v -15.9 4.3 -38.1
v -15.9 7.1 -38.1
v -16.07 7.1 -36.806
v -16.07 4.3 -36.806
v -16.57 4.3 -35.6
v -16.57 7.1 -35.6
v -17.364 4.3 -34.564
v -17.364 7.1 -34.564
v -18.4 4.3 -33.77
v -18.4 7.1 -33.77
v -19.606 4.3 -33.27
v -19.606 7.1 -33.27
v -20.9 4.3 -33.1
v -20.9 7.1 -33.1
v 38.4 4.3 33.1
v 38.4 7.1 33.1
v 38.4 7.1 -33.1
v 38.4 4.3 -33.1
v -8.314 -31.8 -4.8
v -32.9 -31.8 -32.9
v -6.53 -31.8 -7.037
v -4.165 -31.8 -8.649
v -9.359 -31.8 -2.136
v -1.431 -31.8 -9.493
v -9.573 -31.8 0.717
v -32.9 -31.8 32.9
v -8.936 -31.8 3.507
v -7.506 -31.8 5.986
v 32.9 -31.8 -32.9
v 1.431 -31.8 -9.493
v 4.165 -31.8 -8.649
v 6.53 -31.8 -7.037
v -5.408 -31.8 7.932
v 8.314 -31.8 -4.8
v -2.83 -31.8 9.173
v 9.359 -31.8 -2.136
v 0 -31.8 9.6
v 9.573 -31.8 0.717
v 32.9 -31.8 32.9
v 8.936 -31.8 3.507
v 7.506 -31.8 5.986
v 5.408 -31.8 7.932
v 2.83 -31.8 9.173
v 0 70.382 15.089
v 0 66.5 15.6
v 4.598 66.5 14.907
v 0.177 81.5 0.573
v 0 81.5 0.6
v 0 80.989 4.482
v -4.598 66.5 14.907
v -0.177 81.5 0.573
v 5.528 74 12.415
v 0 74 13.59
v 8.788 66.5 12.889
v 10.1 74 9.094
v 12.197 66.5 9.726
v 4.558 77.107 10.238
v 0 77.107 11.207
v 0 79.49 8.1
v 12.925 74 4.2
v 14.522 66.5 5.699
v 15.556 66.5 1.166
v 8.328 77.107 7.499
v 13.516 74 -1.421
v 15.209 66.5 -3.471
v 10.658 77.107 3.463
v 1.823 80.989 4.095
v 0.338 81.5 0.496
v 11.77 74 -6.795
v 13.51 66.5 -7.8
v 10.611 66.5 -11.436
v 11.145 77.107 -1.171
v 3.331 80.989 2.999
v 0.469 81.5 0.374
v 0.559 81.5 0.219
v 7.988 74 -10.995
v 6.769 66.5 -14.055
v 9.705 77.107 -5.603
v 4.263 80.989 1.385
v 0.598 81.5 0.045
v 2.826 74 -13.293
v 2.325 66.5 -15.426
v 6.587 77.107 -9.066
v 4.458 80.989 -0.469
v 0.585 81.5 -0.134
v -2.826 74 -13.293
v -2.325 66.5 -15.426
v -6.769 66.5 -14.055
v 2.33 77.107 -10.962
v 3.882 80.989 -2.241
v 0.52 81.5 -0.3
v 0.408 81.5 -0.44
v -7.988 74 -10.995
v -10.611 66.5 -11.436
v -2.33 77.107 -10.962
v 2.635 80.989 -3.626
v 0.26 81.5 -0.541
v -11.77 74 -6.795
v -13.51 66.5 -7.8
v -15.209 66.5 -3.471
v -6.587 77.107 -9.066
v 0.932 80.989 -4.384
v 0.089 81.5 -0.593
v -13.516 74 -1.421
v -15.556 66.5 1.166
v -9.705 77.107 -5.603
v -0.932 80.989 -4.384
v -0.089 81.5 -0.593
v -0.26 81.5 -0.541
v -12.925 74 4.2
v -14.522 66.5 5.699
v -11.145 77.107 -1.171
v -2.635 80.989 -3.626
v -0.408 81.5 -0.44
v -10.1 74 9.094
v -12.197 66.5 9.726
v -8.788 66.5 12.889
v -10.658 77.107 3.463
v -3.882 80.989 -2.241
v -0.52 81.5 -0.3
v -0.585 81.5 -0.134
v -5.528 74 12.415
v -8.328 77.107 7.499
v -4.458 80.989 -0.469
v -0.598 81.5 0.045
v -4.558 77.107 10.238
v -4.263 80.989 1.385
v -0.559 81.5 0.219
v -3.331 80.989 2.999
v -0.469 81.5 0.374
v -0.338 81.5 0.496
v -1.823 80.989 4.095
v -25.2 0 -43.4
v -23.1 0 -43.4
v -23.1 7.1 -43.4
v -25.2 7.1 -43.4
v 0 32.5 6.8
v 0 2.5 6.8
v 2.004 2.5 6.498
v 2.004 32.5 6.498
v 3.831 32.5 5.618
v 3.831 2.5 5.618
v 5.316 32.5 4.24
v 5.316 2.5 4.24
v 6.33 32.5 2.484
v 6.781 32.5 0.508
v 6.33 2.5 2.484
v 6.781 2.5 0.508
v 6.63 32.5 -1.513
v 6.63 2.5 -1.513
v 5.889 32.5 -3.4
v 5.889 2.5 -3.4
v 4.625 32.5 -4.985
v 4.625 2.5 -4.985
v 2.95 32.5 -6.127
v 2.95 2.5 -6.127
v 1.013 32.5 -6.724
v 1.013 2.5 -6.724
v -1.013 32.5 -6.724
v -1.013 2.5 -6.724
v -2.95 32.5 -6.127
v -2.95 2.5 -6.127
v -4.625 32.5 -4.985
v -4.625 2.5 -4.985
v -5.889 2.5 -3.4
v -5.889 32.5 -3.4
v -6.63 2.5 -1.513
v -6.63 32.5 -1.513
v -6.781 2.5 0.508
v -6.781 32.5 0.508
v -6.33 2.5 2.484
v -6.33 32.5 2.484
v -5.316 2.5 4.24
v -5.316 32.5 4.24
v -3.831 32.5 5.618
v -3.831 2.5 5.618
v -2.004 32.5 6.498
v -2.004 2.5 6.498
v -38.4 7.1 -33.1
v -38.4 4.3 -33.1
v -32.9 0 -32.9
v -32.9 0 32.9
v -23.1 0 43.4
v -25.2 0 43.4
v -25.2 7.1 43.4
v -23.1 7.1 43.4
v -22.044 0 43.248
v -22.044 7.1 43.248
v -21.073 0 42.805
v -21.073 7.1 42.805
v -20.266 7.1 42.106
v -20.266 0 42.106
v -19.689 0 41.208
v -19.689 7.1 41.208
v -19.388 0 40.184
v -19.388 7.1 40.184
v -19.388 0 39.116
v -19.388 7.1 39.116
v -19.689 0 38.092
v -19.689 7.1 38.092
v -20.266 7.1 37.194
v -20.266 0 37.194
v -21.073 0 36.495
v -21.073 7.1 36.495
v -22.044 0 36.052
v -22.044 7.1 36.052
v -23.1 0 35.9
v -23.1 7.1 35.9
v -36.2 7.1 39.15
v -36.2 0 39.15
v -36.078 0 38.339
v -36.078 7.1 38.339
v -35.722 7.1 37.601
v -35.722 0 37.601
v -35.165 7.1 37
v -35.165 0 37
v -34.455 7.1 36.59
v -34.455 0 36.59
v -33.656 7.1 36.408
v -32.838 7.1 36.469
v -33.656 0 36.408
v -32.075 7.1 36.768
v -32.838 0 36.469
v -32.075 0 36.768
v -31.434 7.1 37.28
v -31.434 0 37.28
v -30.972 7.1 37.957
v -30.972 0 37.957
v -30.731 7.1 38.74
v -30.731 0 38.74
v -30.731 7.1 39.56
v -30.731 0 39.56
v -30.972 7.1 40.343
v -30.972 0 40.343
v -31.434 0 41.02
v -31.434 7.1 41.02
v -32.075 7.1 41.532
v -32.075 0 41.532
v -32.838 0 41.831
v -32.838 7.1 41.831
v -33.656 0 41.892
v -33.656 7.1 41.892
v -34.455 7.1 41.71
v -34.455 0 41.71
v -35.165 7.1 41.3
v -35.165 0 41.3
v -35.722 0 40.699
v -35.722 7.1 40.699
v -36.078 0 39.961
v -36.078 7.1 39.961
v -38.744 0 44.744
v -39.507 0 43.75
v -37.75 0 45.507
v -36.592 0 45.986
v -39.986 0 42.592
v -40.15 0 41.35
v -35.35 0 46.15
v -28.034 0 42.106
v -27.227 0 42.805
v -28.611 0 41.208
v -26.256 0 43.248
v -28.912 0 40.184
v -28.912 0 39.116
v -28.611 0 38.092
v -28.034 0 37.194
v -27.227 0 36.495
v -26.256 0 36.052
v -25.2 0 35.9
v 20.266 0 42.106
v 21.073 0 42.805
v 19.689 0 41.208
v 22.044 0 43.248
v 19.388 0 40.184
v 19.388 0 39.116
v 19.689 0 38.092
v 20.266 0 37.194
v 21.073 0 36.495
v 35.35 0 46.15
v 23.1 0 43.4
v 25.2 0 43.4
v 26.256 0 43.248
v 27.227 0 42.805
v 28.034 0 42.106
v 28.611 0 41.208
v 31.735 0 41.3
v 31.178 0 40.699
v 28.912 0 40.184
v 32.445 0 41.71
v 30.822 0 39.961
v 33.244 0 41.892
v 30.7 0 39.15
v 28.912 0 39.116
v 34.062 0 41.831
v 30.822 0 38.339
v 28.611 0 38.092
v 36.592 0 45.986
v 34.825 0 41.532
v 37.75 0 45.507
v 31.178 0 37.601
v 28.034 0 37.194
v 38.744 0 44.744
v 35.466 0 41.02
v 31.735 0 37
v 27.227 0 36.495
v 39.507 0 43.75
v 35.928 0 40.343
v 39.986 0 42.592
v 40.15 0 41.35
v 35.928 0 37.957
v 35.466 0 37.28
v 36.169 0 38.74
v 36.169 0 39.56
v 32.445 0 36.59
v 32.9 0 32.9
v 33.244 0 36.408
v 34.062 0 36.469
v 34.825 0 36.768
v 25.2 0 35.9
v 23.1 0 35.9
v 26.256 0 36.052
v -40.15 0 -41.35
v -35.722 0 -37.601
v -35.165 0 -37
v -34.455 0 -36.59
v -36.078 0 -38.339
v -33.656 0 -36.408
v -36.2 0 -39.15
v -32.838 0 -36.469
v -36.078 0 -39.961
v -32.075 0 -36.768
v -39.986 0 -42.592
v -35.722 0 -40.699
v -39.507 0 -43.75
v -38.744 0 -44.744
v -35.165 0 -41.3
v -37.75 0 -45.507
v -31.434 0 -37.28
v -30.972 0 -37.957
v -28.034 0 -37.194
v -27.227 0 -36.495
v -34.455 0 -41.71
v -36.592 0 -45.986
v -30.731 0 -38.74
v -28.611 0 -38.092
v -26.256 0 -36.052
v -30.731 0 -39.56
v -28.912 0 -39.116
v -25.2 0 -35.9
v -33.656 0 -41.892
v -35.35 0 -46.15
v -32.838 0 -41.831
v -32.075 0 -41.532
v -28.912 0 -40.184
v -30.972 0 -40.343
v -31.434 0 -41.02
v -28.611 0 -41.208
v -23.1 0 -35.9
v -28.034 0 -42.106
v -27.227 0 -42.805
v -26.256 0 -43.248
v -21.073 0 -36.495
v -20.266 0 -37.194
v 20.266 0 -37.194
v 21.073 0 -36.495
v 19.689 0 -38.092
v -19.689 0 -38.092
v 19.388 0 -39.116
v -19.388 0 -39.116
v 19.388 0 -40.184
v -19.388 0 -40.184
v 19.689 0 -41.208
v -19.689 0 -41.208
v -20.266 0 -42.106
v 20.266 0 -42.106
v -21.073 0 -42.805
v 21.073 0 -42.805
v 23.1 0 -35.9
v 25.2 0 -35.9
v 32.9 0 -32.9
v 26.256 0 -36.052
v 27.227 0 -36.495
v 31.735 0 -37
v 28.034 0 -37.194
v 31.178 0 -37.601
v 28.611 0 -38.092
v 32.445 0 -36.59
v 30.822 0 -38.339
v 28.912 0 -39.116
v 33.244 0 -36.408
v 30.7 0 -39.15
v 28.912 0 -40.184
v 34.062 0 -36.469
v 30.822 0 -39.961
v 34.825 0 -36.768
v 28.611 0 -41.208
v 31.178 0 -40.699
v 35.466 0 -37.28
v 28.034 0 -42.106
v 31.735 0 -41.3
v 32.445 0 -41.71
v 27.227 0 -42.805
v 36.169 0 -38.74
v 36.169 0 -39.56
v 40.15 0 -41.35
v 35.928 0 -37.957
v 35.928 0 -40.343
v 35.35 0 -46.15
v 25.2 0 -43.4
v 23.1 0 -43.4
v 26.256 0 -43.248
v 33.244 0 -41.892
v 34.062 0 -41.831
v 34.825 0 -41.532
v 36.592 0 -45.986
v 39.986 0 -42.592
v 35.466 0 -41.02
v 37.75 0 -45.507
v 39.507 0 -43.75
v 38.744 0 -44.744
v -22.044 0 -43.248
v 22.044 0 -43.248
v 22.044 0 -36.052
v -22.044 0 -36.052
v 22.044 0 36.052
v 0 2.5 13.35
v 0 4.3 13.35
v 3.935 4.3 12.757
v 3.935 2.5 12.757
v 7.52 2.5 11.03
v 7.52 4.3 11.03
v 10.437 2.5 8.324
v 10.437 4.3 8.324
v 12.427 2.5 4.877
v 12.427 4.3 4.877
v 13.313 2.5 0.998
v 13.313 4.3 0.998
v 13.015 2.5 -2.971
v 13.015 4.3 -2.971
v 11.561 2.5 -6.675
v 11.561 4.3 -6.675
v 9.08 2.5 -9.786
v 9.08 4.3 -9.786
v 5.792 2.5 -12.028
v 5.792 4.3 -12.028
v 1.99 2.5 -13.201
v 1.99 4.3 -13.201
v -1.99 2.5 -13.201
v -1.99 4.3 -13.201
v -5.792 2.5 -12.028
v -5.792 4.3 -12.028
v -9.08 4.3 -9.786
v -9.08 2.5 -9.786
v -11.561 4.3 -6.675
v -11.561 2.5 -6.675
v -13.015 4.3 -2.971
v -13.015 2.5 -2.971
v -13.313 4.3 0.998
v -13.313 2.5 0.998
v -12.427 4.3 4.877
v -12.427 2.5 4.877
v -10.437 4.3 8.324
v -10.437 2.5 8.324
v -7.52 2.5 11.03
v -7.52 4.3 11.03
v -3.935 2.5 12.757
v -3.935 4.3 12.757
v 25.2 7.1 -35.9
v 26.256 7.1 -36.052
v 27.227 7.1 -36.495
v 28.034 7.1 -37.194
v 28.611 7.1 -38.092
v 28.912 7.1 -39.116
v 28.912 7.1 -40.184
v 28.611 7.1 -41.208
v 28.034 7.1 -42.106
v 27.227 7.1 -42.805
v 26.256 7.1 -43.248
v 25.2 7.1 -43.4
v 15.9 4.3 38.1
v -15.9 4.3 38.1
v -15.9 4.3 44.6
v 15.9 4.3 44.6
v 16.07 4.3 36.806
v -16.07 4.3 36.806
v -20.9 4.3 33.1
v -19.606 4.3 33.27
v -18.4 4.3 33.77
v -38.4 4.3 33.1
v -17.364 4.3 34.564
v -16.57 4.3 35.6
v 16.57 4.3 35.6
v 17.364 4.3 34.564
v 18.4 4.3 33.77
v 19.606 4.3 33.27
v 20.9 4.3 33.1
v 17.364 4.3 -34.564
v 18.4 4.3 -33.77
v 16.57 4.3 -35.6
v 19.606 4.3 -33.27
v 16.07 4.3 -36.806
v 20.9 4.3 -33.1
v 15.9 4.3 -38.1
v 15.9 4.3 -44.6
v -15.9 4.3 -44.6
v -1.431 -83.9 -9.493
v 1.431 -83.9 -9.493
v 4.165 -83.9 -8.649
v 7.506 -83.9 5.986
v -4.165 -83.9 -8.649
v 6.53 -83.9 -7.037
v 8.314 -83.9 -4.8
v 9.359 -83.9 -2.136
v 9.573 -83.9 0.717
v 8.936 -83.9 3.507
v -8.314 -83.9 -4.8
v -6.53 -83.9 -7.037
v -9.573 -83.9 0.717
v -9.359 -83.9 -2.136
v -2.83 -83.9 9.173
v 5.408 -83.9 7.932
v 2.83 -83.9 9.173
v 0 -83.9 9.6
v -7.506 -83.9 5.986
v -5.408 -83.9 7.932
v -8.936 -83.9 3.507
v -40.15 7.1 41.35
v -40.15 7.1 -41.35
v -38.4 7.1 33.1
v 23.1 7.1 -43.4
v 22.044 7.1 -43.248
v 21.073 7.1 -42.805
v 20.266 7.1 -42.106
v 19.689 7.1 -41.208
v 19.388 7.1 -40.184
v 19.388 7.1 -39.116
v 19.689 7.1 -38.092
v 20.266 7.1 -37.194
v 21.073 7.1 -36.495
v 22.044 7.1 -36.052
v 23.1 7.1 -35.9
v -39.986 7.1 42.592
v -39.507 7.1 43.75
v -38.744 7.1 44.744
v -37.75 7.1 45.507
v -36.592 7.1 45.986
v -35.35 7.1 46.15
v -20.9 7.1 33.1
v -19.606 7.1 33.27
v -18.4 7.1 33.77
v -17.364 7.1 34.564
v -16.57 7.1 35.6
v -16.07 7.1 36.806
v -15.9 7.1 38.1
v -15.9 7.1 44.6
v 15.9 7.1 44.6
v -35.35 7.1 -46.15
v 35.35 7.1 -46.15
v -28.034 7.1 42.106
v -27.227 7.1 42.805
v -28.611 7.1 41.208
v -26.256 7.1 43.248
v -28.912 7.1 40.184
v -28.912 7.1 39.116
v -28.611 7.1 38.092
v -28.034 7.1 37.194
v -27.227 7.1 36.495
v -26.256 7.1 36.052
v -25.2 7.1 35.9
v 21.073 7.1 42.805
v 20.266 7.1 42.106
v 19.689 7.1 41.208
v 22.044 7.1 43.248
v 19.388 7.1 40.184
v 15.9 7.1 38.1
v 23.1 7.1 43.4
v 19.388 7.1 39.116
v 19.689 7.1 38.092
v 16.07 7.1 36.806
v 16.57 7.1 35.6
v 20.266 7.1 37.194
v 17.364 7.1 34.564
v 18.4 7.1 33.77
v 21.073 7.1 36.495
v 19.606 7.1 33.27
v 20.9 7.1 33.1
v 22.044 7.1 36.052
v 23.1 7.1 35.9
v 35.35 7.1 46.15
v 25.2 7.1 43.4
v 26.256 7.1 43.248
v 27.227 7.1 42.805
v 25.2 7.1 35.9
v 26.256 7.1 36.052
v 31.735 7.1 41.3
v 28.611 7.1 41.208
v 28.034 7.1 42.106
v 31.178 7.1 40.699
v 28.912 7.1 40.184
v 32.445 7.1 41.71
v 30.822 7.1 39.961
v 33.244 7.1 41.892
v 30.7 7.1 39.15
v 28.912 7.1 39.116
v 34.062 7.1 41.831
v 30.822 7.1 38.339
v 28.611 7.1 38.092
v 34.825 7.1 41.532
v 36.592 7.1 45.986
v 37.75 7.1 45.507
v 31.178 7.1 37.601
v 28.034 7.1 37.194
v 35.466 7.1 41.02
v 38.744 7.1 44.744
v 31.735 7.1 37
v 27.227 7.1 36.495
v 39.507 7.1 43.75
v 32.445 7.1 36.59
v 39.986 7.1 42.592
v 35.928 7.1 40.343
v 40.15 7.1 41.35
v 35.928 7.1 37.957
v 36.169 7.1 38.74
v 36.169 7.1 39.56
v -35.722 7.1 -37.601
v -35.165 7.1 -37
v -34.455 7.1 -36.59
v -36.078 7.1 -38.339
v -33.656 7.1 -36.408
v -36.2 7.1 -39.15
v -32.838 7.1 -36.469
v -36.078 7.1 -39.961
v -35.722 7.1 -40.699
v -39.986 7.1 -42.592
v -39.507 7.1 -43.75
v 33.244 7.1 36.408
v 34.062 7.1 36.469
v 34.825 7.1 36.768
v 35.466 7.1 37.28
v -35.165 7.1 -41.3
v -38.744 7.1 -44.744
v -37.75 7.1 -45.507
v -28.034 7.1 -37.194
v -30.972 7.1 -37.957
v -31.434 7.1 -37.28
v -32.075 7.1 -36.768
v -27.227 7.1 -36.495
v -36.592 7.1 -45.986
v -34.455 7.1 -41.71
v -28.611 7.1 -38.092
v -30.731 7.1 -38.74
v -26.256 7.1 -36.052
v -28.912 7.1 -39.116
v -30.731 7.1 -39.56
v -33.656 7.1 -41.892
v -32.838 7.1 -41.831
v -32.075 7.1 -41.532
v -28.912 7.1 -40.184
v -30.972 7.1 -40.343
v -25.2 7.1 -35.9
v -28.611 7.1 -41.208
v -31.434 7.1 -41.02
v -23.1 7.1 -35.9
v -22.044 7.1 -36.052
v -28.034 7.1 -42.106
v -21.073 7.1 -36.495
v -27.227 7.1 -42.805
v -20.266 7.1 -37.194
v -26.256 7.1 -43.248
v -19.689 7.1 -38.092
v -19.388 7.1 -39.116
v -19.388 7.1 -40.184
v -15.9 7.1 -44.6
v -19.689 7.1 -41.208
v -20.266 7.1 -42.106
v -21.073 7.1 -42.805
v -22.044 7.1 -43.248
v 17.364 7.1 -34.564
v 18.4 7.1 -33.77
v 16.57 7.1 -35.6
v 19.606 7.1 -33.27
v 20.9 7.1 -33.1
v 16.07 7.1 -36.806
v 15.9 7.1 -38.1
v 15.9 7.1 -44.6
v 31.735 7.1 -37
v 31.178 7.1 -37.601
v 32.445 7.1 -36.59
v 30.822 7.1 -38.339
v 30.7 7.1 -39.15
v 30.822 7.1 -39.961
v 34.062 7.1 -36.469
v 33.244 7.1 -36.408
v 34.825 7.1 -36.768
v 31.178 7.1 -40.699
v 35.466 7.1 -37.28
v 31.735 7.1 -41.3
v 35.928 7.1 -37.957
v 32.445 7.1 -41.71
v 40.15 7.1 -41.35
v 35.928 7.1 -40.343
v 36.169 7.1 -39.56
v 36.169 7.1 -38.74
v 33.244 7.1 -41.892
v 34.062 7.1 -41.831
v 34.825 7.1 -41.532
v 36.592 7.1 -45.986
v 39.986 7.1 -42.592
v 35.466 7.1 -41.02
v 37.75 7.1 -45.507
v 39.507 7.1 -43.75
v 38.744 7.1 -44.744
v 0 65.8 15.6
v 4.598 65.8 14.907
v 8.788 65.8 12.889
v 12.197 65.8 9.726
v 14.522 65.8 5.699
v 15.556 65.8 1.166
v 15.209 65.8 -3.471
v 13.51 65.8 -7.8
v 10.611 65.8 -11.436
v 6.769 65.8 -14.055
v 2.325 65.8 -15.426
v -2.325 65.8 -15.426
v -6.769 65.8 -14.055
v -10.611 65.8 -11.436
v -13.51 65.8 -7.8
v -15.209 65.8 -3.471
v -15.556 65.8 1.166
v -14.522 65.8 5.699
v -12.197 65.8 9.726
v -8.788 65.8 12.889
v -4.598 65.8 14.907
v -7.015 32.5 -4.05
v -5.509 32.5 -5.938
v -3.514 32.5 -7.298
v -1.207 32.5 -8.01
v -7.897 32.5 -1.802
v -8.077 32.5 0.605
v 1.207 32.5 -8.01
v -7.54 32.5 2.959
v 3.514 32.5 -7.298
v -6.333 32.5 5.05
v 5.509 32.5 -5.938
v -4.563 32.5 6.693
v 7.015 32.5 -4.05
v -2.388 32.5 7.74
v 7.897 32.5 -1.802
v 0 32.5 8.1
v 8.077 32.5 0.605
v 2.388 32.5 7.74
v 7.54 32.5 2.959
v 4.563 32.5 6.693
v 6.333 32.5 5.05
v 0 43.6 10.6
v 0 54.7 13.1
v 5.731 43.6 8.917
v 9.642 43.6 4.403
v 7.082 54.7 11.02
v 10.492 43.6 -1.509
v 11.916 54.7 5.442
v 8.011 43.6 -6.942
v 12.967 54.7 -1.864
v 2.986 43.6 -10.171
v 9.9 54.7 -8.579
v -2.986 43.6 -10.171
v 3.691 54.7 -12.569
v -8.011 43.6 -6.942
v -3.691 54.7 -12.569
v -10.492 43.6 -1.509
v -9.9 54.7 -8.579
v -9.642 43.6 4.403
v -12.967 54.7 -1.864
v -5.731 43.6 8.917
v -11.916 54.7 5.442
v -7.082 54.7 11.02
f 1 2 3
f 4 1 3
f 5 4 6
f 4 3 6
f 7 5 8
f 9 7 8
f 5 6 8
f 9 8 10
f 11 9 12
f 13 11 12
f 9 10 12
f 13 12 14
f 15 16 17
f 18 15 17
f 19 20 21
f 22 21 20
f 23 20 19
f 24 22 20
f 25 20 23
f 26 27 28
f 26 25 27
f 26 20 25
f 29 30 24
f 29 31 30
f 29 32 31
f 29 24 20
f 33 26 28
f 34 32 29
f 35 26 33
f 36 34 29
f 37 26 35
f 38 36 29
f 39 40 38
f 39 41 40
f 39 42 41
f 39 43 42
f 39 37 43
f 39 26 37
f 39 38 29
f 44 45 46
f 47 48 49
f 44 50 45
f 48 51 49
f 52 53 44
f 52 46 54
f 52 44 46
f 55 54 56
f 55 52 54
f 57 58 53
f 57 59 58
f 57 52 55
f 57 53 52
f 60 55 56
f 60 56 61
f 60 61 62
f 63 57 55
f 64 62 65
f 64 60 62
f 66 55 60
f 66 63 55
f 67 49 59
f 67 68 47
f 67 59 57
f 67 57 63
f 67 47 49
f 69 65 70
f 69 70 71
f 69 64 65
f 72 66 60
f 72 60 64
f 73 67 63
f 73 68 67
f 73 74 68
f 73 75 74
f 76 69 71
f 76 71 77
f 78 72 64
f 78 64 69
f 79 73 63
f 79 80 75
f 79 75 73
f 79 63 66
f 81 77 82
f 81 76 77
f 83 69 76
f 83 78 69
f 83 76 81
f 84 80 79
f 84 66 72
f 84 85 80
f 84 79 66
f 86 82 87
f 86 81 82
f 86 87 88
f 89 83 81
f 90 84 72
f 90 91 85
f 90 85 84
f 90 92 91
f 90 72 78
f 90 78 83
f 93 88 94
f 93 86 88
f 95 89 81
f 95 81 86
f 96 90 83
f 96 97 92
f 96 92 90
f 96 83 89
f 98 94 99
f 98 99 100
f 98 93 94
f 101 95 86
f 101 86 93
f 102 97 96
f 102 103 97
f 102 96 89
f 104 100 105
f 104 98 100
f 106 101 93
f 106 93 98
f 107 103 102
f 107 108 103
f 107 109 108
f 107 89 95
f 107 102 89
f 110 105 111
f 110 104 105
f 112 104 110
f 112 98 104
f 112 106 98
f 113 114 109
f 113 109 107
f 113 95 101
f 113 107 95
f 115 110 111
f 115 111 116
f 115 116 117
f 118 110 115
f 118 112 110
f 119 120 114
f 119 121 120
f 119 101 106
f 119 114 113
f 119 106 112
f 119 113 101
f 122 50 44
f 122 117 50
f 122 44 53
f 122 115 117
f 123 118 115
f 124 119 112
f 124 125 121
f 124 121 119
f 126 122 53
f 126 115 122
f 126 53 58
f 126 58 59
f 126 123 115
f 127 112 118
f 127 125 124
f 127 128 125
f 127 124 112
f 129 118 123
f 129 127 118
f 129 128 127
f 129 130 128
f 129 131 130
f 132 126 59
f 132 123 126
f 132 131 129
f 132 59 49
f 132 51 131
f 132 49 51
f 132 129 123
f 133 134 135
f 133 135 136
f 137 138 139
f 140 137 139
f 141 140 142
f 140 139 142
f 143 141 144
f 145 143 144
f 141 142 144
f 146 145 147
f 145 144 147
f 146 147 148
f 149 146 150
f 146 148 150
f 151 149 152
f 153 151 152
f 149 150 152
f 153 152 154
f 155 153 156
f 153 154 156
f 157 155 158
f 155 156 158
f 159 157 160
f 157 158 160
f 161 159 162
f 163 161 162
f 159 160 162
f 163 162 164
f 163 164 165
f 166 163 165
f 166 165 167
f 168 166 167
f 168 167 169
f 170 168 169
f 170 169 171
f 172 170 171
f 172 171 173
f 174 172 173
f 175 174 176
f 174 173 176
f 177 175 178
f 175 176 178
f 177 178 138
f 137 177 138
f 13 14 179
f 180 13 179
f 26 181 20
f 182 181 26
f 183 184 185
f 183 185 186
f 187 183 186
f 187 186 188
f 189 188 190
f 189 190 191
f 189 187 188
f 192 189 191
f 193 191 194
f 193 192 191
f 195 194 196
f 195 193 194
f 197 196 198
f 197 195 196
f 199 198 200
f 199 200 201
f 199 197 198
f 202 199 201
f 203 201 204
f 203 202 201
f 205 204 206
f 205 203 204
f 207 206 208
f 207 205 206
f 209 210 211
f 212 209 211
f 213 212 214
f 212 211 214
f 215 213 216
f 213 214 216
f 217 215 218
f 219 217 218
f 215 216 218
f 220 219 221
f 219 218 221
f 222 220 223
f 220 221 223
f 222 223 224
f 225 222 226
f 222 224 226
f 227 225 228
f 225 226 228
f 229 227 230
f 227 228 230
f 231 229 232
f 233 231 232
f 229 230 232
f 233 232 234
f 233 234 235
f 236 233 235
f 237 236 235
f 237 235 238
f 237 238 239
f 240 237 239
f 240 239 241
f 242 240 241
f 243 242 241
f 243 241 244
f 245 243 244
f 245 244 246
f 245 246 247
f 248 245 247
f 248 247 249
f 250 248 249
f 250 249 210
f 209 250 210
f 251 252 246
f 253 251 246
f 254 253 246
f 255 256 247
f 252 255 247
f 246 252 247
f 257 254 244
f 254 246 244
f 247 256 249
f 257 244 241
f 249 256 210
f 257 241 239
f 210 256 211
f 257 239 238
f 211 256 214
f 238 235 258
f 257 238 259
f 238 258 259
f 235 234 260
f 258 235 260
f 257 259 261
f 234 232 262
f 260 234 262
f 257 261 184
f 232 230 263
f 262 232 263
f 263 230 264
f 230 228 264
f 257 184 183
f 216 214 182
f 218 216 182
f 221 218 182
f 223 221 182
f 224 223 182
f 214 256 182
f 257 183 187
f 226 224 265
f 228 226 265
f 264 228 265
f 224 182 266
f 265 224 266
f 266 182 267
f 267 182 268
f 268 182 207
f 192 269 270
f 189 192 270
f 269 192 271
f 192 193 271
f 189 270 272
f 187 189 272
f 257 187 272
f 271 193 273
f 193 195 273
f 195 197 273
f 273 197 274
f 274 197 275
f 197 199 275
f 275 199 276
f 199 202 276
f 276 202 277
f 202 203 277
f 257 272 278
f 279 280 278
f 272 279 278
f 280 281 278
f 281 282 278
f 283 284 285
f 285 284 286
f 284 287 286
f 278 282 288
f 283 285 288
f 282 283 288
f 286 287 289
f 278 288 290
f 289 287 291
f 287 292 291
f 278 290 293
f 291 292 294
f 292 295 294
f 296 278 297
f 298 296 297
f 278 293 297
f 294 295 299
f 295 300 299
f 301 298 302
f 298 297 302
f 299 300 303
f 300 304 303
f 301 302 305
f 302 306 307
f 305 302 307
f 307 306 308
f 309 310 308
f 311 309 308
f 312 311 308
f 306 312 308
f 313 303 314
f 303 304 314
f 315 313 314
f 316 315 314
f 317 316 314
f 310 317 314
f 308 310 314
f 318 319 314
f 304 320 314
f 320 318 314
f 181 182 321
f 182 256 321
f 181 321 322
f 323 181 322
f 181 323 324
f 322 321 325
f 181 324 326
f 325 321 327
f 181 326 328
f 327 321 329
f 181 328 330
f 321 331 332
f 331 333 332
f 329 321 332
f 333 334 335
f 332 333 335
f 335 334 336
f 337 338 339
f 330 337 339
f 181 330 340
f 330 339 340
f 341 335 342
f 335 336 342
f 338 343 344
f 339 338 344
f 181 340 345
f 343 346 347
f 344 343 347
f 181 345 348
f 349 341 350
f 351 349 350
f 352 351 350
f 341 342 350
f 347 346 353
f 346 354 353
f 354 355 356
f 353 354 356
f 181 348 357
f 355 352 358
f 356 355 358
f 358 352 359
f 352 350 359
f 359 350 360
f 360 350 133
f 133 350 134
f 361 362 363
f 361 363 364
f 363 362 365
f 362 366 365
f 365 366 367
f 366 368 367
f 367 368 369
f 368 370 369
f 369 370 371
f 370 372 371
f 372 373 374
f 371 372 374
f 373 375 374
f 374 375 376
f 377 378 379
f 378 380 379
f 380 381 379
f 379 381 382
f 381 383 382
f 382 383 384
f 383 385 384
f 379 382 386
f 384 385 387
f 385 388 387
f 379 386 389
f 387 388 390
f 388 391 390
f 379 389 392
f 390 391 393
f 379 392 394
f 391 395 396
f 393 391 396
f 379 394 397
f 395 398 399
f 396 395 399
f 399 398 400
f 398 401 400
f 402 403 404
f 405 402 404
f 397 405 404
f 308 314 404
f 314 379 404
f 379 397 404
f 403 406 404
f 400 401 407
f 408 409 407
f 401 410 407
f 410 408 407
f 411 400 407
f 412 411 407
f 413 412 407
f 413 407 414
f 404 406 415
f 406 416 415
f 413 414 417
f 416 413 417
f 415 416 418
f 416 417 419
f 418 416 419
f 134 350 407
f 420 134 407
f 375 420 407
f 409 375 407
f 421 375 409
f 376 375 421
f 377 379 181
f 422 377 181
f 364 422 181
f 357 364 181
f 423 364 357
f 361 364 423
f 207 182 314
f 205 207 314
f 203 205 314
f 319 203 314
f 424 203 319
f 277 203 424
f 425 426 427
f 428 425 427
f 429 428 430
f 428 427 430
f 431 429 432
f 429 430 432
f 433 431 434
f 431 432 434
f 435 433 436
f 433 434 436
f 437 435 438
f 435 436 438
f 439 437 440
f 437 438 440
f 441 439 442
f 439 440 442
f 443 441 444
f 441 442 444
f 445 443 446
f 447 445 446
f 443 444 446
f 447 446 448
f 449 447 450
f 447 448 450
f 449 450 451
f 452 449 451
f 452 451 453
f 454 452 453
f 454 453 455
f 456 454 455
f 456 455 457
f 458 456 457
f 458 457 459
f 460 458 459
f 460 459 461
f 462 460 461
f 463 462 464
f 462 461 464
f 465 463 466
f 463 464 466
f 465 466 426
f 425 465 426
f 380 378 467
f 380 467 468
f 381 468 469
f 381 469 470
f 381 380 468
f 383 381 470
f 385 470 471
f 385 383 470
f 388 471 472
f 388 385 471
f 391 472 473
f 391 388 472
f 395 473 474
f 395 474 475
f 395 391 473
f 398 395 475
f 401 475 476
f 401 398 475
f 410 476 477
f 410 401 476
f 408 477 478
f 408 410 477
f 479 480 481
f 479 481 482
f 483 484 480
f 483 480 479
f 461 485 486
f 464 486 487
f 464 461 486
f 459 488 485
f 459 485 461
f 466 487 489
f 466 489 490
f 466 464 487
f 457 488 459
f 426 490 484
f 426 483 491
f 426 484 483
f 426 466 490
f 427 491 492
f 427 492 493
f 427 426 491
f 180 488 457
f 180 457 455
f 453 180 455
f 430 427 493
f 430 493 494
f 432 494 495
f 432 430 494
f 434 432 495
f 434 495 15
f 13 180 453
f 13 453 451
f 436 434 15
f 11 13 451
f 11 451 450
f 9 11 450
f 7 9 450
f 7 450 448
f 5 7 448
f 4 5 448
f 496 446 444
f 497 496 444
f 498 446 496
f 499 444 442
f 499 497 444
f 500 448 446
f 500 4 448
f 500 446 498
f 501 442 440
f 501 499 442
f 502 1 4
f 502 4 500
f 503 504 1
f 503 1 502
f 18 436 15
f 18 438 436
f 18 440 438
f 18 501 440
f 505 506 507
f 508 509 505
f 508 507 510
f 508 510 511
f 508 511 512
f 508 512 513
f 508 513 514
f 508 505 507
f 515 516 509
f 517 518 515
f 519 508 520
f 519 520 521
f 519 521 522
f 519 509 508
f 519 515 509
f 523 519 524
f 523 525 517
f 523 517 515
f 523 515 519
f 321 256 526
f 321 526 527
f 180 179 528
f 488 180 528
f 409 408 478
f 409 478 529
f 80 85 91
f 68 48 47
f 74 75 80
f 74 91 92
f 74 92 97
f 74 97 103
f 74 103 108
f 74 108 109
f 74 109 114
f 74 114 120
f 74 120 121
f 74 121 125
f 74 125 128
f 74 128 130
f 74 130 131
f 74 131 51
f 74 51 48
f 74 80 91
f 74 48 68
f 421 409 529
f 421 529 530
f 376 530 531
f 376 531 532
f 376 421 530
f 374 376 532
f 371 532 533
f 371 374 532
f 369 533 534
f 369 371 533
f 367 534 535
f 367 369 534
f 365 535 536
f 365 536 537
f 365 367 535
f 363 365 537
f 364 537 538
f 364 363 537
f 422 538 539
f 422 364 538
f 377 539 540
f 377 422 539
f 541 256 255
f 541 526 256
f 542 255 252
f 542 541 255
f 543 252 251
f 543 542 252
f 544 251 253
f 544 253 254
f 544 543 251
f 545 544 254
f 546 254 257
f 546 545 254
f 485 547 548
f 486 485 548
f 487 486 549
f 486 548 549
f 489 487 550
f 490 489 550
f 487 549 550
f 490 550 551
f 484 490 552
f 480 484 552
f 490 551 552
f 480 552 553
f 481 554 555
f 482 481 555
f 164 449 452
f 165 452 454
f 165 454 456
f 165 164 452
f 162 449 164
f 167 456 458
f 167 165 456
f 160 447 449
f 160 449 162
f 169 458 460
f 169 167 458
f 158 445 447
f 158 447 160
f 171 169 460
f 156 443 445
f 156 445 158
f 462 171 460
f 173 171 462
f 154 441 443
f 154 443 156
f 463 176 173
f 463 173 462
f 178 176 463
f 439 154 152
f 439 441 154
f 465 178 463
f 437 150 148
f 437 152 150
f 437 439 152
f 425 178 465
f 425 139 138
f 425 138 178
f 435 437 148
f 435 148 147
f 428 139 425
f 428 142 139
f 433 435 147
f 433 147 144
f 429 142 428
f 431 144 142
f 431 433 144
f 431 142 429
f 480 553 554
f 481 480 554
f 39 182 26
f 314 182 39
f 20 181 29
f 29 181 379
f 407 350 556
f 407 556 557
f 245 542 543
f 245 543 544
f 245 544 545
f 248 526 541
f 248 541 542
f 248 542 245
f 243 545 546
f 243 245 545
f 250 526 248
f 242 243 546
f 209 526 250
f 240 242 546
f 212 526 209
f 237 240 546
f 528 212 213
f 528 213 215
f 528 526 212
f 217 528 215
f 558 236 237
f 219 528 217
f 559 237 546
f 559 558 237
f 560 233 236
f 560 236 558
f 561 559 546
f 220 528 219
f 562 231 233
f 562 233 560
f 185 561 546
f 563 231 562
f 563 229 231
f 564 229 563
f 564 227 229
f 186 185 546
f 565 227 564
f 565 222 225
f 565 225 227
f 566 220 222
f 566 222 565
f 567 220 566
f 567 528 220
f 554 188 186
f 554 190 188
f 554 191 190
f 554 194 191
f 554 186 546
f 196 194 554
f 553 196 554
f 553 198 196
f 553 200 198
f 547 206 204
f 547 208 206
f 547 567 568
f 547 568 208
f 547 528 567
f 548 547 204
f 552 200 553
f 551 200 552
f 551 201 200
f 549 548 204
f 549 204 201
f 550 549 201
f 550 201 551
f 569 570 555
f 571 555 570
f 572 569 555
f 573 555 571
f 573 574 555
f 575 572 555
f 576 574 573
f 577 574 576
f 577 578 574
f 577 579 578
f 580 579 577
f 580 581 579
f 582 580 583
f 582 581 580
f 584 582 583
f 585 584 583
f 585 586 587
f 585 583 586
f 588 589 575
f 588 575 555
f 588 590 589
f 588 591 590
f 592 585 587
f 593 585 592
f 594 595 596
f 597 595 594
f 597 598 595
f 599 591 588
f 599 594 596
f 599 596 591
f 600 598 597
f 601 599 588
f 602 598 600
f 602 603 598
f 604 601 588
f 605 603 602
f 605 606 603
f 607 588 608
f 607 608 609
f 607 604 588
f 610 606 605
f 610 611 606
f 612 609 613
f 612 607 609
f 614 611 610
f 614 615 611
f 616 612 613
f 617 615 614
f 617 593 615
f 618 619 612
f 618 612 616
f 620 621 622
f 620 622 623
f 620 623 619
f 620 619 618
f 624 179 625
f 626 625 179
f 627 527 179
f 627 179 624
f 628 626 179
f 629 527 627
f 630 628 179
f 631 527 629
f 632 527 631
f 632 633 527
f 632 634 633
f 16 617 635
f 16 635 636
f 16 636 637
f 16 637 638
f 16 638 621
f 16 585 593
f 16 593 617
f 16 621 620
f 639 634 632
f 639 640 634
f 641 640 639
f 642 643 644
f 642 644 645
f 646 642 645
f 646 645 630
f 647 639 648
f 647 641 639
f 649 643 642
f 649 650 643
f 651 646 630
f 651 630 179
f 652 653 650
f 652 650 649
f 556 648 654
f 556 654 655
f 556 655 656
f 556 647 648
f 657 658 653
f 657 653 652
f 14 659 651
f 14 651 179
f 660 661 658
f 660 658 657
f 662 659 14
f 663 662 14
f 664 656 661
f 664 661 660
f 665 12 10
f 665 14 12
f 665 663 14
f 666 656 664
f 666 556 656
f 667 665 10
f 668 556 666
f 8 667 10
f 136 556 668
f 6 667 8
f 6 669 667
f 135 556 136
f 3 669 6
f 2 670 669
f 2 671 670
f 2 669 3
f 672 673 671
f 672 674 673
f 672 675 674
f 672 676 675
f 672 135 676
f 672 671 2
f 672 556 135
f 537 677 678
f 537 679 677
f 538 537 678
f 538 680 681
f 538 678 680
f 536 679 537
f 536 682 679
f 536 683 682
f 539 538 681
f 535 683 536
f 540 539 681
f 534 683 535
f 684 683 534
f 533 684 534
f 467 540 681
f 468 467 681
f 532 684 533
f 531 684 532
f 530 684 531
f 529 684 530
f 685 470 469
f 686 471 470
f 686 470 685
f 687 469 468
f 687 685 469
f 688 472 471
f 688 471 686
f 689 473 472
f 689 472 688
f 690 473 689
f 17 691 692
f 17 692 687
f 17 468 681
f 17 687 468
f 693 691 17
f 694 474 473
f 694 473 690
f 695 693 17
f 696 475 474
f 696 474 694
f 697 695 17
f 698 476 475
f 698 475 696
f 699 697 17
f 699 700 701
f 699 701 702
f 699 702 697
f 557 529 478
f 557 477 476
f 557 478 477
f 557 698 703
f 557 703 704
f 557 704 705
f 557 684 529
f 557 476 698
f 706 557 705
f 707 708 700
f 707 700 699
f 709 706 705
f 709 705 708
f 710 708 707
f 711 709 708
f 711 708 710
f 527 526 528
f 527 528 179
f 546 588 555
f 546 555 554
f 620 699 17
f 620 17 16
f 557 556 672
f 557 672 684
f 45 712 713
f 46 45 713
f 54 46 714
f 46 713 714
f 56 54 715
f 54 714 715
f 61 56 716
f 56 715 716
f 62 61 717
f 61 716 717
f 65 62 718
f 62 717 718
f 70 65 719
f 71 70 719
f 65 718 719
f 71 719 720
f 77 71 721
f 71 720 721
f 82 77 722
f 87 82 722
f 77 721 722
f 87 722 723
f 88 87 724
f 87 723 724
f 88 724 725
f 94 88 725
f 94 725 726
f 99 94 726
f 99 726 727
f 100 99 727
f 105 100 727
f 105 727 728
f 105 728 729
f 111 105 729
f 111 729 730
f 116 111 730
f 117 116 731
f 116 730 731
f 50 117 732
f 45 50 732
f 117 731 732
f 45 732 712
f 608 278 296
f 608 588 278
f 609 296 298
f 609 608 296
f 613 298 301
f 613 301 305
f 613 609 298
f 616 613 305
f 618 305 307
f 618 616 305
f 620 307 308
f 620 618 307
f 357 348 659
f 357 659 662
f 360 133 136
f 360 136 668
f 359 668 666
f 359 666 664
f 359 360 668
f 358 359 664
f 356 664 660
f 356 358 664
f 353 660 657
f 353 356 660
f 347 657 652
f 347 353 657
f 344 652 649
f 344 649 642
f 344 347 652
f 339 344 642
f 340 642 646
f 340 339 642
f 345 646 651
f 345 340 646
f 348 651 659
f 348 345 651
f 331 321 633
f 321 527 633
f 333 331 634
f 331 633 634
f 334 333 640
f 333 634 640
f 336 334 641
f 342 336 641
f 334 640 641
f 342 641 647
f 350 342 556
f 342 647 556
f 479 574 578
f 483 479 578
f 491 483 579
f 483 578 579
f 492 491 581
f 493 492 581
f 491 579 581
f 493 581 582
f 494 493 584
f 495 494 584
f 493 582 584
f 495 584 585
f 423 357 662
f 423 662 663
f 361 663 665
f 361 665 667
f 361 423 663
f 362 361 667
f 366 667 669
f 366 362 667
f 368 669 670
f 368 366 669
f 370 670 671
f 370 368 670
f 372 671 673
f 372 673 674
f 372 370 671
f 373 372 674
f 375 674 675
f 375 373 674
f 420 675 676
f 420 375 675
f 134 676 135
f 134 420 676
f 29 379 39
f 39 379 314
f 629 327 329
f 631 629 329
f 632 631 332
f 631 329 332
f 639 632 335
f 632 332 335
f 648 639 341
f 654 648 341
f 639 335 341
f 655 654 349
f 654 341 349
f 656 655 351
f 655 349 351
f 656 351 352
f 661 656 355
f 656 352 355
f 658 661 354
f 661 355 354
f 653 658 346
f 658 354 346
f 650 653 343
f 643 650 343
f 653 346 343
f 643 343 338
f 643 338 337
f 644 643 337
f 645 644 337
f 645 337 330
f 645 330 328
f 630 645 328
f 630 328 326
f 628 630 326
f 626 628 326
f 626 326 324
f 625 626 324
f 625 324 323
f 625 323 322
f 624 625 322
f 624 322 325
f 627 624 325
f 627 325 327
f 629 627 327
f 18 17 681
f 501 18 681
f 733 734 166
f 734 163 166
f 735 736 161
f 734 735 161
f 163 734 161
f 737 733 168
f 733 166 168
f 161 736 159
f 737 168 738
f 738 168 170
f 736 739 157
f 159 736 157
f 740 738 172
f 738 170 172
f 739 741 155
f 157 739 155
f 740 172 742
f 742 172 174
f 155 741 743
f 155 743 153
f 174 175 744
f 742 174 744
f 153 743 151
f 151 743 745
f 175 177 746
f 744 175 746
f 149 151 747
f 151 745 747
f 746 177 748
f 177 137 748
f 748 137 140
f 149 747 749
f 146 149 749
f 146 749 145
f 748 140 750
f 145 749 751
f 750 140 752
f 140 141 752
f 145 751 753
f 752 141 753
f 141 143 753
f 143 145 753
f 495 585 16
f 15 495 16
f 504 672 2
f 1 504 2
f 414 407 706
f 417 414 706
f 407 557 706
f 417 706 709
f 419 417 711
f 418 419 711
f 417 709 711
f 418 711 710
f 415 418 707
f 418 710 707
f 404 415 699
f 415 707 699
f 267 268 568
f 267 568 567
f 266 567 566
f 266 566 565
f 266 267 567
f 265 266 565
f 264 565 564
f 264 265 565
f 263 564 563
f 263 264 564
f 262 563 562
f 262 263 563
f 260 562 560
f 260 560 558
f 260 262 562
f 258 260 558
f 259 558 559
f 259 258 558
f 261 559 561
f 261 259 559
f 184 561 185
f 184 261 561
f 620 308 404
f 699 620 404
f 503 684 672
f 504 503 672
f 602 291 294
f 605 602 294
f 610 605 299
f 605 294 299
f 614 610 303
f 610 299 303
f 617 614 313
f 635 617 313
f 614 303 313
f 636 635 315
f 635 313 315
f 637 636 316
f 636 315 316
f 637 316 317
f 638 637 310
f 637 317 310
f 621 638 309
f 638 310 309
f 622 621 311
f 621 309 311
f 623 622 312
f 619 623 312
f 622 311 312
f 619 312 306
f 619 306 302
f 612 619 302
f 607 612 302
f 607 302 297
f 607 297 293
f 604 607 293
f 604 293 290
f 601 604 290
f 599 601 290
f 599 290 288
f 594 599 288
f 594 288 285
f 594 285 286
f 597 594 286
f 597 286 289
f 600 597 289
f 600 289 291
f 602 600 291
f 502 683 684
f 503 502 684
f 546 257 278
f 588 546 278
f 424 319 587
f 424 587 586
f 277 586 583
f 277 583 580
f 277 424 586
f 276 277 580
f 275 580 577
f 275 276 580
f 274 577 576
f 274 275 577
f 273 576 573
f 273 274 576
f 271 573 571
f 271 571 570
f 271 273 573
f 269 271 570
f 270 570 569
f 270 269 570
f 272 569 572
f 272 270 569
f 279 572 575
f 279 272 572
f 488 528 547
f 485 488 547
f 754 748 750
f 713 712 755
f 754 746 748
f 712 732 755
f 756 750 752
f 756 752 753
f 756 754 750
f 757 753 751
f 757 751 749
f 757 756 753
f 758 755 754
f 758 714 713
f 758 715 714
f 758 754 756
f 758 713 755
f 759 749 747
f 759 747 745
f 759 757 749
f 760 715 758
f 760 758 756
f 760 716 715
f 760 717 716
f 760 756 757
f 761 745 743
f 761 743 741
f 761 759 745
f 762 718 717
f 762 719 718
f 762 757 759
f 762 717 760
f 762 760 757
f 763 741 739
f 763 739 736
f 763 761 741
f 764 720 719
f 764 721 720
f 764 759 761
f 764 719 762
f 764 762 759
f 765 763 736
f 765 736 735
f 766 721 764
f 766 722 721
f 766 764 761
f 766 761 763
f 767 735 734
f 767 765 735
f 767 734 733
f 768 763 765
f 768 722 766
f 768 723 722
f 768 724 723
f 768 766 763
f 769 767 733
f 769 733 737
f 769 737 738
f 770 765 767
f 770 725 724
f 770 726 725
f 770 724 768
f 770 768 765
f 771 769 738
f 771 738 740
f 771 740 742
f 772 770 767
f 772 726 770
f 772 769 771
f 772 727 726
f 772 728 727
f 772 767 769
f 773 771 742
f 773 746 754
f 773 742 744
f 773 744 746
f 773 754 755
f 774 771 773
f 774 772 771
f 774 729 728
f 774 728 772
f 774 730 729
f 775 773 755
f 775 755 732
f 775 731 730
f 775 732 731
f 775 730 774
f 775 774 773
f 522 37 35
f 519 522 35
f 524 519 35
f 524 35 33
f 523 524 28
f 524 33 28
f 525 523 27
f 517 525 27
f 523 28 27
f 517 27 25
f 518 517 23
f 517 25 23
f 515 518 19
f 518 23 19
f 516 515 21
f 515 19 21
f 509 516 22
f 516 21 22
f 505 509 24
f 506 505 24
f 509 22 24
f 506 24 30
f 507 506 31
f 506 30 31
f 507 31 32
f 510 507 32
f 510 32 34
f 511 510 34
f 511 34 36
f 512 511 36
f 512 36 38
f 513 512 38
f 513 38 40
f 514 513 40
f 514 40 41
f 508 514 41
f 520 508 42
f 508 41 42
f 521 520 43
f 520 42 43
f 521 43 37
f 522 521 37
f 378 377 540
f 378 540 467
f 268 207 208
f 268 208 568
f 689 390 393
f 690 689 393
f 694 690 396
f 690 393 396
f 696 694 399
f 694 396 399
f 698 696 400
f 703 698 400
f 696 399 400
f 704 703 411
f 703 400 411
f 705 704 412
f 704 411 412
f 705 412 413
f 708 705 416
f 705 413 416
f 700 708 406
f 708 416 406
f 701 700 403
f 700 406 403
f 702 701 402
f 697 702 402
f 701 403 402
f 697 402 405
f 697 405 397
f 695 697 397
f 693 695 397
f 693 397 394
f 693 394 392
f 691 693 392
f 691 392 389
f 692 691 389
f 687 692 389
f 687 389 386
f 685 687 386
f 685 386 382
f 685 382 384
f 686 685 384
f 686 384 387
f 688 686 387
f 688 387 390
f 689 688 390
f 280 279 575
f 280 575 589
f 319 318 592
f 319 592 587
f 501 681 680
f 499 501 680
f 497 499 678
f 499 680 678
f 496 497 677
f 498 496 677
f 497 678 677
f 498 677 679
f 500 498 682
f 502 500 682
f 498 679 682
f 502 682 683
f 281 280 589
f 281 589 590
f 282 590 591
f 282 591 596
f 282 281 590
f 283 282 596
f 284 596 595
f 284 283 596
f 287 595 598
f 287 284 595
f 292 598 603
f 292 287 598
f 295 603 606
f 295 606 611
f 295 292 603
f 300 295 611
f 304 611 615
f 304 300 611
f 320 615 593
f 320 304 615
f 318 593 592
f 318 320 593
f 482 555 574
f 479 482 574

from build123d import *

# Parameters (mm, degrees)
SKETCH1_W                = 80.3
SKETCH1_H                = 92.3
BOSS_EXTRUDE1_DEPTH      = 7.1
SKETCH2_W                = 65.8
SKETCH2_H                = 65.8
BOSS_EXTRUDE2_DEPTH      = 31.8
SKETCH3_R                = 9.6
BOSS_EXTRUDE3_DEPTH      = 52.1
CUT_EXTRUDE1_DEPTH       = 2.8
M5_CLEARANCE_SLOT1_D     = 5.5
FILLET1_R                = 4.8
M5_CLEARANCE_SLOT2_DEPTH = 7.1
SKETCH9_R                = 13.35
CUT_EXTRUDE2_DEPTH       = 1.8
SKETCH10_R               = 6.8
BOSS_EXTRUDE4_DEPTH      = 30
SKETCH11_R               = 15.6
BOSS_EXTRUDE5_DEPTH      = 49
FILLET2_R                = 15
CHAMFER1_SIZE            = 7.5
CHAMFER1_SIZE2           = 33.3


# Read off the part's stored shape, not the designer's step: M5 Clearance Slot2
with BuildPart() as part:
    # Sketch1 → Boss-Extrude1 (new body)
    with BuildSketch(Plane(origin=(0, 0, 0), x_dir=(1, 0, 0), z_dir=(0, 1, 0))):
        Rectangle(SKETCH1_W, SKETCH1_H)
    extrude(amount=BOSS_EXTRUDE1_DEPTH)

    # Sketch2 → Boss-Extrude2 (add)
    with BuildSketch(Plane.XZ):
        Rectangle(SKETCH2_W, SKETCH2_H)
    extrude(amount=BOSS_EXTRUDE2_DEPTH)

    # Sketch3 → Boss-Extrude3 (add)
    with BuildSketch(Plane.XZ.offset(31.8)):
        with Locations(Location((0, 0, 0), (0, 0, 90))):
            Circle(SKETCH3_R)
    extrude(amount=BOSS_EXTRUDE3_DEPTH)

    # Sketch4 → Cut-Extrude1 (cut)
    with BuildSketch(Plane(origin=(0, 7.1, 0), x_dir=(1, 0, 0), z_dir=(0, 1, 0))):
        with BuildLine():
            Line((-38.4, 33.1), (-38.4, -33.1))
            Line((-38.4, -33.1), (-20.9, -33.1))
            ThreePointArc((-20.9, -33.1), (-17.364466094, -34.564466094), (-15.9, -38.1))
            Line((-15.9, -38.1), (-15.9, -44.6))
            Line((-15.9, -44.6), (15.9, -44.6))
            Line((15.9, -44.6), (15.9, -38.1))
            ThreePointArc((15.9, -38.1), (17.364466094, -34.564466094), (20.9, -33.1))
            Line((20.9, -33.1), (38.4, -33.1))
            Line((38.4, -33.1), (38.4, 33.1))
            Line((38.4, 33.1), (20.9, 33.1))
            ThreePointArc((20.9, 33.1), (17.364466094, 34.564466094), (15.9, 38.1))
            Line((15.9, 38.1), (15.9, 44.6))
            Line((15.9, 44.6), (-15.9, 44.6))
            Line((-15.9, 44.6), (-15.9, 38.1))
            ThreePointArc((-15.9, 38.1), (-17.364466094, 34.564466094), (-20.9, 33.1))
            Line((-20.9, 33.1), (-38.4, 33.1))
        make_face()
    extrude(amount=-CUT_EXTRUDE1_DEPTH, mode=Mode.SUBTRACT)

    # M5 Clearance Slot1 (through all)
    with Locations(Plane(origin=(0, 7.1, 0), x_dir=(1, 0, 0), z_dir=(0, 1, 0))):
        with Locations((-33.45, 39.15), (33.45, 39.15), (33.45, -39.15), (-33.45, -39.15)):
            Hole(M5_CLEARANCE_SLOT1_D / 2)

    # Fillet1
    fillet1_edges = [part.edges().sort_by_distance(p)[0] for p in [
        (40.15, 3.55, 46.15),
        (-40.15, 3.55, 46.15),
        (-40.15, 3.55, -46.15),
        (40.15, 3.55, -46.15),
    ]]
    fillet(fillet1_edges, radius=FILLET1_R)

    # M5 Clearance Slot2 outline → M5 Clearance Slot2 (cut)
    with BuildSketch(Plane(origin=(0, 0, 0), x_dir=(1, 0, 0), z_dir=(0, 1, 0))):
        with BuildLine():
            Line((23.1, 35.9), (25.2, 35.9))
            ThreePointArc((25.2, 35.9), (28.95, 39.65), (25.2, 43.4))
            Line((25.2, 43.4), (23.1, 43.4))
            ThreePointArc((23.1, 43.4), (19.35, 39.65), (23.1, 35.9))
        make_face()
        with BuildLine():
            ThreePointArc((-23.1, 35.9), (-19.35, 39.65), (-23.1, 43.4))
            Line((-23.1, 43.4), (-25.2, 43.4))
            ThreePointArc((-25.2, 43.4), (-28.95, 39.65), (-25.2, 35.9))
            Line((-25.2, 35.9), (-23.1, 35.9))
        make_face()
        with BuildLine():
            Line((23.1, -43.4), (25.2, -43.4))
            ThreePointArc((25.2, -43.4), (28.95, -39.65), (25.2, -35.9))
            Line((25.2, -35.9), (23.1, -35.9))
            ThreePointArc((23.1, -35.9), (19.35, -39.65), (23.1, -43.4))
        make_face()
        with BuildLine():
            ThreePointArc((-23.1, -43.4), (-19.35, -39.65), (-23.1, -35.9))
            Line((-23.1, -35.9), (-25.2, -35.9))
            ThreePointArc((-25.2, -35.9), (-28.95, -39.65), (-25.2, -43.4))
            Line((-25.2, -43.4), (-23.1, -43.4))
        make_face()
    extrude(amount=M5_CLEARANCE_SLOT2_DEPTH, mode=Mode.SUBTRACT)

    # Sketch9 → Cut-Extrude2 (cut)
    with BuildSketch(Plane(origin=(0, 4.3, 0), x_dir=(1, 0, 0), z_dir=(0, 1, 0))):
        with Locations(Location((0, 0, 0), (0, 0, 270))):
            Circle(SKETCH9_R)
    extrude(amount=-CUT_EXTRUDE2_DEPTH, mode=Mode.SUBTRACT)

    # Sketch10 → Boss-Extrude4 (add)
    with BuildSketch(Plane(origin=(0, 2.5, 0), x_dir=(1, 0, 0), z_dir=(0, 1, 0))):
        with Locations(Location((0, 0, 0), (0, 0, 270))):
            Circle(SKETCH10_R)
    extrude(amount=BOSS_EXTRUDE4_DEPTH)

    # Sketch11 → Boss-Extrude5 (add)
    with BuildSketch(Plane(origin=(0, 32.5, 0), x_dir=(1, 0, 0), z_dir=(0, 1, 0))):
        with Locations(Location((0, 0, 0), (0, 0, 270))):
            Circle(SKETCH11_R)
    extrude(amount=BOSS_EXTRUDE5_DEPTH)

    # Fillet2
    fillet2_edges = [part.edges().sort_by_distance(p)[0] for p in [
        (0, 81.5, -15.6),
    ]]
    fillet(fillet2_edges, radius=FILLET2_R)

    # Chamfer1
    chamfer1_edges = [part.edges().sort_by_distance(p)[0] for p in [
        (0, 32.5, -15.6),
    ]]
    chamfer1_side = [part.faces().sort_by_distance(p)[0] for p in [
        (0, 32.5, -15.158765369),
    ]]
    chamfer(chamfer1_edges, length=CHAMFER1_SIZE, length2=CHAMFER1_SIZE2, reference=chamfer1_side[0])


solid = part.part
